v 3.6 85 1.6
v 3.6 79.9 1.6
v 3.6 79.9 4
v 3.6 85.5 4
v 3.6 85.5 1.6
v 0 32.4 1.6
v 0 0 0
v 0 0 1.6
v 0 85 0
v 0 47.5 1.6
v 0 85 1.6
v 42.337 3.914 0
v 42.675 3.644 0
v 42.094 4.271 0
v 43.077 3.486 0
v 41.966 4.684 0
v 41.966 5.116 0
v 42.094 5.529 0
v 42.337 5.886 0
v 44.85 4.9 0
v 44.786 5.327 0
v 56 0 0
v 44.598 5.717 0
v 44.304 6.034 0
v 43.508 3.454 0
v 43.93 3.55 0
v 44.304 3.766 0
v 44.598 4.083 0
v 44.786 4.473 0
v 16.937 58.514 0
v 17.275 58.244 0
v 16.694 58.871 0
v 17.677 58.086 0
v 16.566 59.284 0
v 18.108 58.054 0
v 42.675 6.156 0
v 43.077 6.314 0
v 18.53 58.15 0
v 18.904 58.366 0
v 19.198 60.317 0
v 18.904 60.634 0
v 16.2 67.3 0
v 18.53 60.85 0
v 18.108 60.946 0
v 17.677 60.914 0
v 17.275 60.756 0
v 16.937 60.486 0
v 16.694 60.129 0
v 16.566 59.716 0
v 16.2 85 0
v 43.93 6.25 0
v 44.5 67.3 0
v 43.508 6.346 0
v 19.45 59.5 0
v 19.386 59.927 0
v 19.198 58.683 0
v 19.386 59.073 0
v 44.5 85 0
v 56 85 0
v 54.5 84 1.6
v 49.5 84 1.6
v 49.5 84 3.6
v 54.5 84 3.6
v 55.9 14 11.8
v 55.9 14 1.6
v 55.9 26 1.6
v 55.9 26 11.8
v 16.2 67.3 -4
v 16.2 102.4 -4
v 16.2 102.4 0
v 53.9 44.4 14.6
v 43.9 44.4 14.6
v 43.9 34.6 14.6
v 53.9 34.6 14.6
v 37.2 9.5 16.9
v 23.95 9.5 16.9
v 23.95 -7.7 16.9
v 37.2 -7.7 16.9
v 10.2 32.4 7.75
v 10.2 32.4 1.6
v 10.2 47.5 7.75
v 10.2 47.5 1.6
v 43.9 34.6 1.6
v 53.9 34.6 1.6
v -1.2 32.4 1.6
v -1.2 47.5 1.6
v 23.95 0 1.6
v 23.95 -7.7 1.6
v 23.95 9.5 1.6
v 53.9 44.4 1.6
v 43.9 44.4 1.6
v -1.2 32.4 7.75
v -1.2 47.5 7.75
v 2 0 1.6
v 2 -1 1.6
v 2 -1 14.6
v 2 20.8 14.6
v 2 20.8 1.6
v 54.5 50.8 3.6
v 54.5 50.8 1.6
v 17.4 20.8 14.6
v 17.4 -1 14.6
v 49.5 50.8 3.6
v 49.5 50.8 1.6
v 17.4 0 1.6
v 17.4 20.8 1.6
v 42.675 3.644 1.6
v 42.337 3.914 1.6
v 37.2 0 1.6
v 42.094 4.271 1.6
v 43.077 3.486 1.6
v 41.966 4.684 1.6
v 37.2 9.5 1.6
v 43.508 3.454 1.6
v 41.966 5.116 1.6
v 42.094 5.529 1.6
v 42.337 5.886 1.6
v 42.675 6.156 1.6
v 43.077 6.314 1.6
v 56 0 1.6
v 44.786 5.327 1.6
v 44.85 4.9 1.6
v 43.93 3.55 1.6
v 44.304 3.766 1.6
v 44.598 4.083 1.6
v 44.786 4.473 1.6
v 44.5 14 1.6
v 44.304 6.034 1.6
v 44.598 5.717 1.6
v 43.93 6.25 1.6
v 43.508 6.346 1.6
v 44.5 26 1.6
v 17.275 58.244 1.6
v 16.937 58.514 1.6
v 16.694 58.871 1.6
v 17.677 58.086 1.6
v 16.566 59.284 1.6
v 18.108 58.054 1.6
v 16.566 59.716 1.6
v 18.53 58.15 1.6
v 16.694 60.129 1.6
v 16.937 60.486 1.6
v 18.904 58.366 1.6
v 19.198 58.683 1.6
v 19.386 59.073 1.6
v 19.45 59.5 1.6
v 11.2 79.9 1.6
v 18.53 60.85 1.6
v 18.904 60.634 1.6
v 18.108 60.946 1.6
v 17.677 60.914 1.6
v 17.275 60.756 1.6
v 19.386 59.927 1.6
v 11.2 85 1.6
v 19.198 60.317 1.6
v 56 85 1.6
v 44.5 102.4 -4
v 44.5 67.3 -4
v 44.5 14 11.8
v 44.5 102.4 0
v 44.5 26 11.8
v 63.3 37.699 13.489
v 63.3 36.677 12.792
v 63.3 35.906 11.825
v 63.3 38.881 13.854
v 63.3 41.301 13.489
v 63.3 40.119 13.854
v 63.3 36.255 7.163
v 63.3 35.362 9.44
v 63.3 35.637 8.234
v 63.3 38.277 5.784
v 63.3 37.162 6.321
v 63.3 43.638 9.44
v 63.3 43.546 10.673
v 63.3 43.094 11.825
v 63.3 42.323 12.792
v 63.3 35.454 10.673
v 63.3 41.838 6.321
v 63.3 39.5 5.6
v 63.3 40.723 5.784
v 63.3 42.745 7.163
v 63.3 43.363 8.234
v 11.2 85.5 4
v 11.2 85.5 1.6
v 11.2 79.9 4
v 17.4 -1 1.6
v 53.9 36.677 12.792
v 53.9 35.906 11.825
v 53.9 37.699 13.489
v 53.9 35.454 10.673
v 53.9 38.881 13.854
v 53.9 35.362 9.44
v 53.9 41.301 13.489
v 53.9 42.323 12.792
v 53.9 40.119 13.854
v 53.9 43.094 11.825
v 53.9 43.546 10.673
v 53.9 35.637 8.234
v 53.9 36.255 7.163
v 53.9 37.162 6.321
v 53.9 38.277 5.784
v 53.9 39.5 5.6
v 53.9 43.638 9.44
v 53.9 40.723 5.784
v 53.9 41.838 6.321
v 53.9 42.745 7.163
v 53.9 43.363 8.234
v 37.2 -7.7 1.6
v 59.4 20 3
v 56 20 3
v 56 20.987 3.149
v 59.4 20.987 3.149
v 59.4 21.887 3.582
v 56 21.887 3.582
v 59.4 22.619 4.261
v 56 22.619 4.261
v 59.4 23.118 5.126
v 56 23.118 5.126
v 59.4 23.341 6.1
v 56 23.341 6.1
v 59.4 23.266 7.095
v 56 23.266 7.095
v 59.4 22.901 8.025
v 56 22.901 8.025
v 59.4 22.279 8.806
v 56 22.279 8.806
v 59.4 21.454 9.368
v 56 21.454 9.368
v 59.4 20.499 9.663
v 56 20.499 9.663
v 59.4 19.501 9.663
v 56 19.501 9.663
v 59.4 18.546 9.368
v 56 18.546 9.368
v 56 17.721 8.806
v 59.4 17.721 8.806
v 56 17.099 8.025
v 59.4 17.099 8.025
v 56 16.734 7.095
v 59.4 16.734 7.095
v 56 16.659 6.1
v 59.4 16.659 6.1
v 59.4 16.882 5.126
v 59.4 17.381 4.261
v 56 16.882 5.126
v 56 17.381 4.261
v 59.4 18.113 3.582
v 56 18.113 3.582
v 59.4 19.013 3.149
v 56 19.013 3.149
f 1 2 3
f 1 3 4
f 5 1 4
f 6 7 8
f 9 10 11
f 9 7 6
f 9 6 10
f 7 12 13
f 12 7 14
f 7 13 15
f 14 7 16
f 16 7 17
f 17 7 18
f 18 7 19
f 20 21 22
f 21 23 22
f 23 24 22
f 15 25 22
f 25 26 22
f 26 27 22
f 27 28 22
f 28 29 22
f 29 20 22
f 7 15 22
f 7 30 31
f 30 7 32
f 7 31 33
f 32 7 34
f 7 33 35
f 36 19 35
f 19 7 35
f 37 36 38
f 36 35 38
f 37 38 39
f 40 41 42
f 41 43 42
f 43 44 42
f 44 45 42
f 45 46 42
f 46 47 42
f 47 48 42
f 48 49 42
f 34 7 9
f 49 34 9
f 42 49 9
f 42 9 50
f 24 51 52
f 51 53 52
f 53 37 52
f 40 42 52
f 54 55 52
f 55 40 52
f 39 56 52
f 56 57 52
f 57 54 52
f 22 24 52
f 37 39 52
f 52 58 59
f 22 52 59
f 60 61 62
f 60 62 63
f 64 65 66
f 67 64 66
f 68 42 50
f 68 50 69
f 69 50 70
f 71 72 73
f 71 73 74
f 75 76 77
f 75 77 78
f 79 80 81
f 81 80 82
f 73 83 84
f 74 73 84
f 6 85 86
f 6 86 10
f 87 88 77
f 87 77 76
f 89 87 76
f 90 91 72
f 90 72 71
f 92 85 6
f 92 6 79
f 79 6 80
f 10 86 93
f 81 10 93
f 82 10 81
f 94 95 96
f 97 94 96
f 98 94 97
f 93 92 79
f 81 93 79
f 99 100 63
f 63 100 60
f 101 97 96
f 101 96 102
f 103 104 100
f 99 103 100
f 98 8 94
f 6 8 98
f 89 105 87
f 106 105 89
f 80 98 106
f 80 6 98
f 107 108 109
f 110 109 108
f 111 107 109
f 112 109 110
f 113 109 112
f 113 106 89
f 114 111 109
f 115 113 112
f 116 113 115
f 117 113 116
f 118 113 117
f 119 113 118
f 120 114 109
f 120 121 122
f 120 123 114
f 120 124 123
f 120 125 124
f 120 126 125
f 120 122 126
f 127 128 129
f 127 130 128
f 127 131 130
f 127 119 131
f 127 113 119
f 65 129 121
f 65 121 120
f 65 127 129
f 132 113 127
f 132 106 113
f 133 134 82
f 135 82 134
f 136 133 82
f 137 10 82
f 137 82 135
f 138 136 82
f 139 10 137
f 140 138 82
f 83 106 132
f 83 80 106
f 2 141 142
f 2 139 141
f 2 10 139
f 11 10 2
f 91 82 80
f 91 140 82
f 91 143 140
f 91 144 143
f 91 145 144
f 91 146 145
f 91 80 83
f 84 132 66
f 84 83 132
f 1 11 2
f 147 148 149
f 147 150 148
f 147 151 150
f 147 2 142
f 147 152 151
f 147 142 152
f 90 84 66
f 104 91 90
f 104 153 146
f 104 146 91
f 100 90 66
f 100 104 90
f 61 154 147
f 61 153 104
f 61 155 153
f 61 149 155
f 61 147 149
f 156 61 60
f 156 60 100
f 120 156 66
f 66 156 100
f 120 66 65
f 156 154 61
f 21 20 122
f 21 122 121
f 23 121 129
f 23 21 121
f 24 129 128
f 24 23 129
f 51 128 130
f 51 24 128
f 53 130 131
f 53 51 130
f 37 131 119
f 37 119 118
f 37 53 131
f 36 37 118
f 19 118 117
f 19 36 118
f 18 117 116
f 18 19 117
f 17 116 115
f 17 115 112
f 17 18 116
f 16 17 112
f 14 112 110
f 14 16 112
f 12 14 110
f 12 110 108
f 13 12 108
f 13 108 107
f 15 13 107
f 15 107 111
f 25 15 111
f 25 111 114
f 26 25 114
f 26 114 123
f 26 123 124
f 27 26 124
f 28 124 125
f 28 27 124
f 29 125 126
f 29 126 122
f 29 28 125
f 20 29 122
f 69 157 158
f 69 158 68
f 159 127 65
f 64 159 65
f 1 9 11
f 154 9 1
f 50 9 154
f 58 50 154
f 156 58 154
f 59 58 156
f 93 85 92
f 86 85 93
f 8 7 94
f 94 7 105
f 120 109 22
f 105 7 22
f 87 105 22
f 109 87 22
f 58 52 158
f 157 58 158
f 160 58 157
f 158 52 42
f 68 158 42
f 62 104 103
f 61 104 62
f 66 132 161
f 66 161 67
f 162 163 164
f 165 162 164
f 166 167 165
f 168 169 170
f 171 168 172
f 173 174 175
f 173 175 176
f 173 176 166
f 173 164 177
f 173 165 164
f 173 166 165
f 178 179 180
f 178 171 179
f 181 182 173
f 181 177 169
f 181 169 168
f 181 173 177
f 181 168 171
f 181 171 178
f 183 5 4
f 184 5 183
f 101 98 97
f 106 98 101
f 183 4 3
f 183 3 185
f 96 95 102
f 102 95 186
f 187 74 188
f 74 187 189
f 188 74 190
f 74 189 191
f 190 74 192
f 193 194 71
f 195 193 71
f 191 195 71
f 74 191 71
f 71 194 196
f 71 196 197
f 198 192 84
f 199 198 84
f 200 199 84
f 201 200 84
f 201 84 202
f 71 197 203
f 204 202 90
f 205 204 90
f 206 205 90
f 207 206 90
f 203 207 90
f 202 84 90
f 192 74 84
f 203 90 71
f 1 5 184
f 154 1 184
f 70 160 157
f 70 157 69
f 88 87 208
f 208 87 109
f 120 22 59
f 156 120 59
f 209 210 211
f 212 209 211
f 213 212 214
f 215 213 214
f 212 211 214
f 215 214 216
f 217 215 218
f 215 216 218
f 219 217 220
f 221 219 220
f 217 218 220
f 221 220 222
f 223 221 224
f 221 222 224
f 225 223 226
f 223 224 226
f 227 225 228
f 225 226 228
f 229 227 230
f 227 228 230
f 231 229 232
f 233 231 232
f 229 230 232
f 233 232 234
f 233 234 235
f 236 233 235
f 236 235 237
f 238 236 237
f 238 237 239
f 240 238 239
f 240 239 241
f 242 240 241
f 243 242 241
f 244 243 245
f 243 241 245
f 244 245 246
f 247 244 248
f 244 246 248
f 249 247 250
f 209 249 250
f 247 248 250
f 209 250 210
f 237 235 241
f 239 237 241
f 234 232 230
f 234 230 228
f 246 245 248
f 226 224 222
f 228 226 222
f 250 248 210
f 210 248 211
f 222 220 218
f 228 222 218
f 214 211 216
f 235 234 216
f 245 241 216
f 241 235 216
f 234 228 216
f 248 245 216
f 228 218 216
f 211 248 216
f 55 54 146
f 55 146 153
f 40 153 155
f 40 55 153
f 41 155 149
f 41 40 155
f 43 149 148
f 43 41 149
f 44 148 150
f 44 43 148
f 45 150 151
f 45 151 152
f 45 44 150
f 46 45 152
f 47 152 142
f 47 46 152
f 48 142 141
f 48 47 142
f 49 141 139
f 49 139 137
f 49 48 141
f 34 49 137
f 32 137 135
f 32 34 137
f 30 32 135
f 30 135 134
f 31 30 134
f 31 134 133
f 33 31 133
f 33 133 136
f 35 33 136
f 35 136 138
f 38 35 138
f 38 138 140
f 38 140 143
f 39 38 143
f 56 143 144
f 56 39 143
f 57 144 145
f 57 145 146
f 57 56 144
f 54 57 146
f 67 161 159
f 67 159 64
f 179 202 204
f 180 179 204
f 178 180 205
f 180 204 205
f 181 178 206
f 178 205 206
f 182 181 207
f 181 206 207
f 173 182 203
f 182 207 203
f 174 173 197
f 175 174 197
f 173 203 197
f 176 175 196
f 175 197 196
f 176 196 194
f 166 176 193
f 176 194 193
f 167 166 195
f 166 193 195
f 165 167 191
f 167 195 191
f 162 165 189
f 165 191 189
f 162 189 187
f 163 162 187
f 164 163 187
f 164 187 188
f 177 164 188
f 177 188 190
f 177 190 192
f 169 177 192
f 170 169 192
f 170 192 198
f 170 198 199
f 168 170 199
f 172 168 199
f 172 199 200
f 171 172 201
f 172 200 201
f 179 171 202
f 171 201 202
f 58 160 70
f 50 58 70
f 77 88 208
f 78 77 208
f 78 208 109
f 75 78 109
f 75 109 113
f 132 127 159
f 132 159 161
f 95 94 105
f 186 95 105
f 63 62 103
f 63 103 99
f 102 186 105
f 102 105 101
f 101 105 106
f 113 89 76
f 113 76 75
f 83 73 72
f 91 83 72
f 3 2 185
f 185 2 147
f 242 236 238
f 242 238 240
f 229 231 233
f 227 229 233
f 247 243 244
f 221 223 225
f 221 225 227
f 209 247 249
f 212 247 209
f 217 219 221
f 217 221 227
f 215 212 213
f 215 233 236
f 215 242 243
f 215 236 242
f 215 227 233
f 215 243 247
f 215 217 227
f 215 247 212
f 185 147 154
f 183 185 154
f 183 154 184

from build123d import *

# Parameters (mm, degrees)
CROQUIS1_W               = 56
CROQUIS1_H               = 85
CROQUIS1_R               = 1.45
SALIENTE_EXTRUIR1_DEPTH  = 1.6
CROQUIS2_W               = 7.6
CROQUIS2_H               = 5.6
SALIENTE_EXTRUIR2_DEPTH  = 2.4
CROQUIS3_W               = 11.4
CROQUIS3_H               = 15.1
SALIENTE_EXTRUIR3_DEPTH  = 6.15
CROQUIS4_W               = 15.4
CROQUIS4_H               = 21.8
SALIENTE_EXTRUIR4_DEPTH  = 13
CROQUIS5_W               = 13.25
CROQUIS5_H               = 17.2
SALIENTE_EXTRUIR5_DEPTH  = 15.3
CROQUIS6_W               = 11.4
CROQUIS6_H               = 12
SALIENTE_EXTRUIR6_DEPTH  = 10.2
CROQUIS7_W               = 10
CROQUIS7_H               = 9.8
SALIENTE_EXTRUIR7_DEPTH  = 13
CROQUIS8_W               = 5
CROQUIS8_H               = 33.2
SALIENTE_EXTRUIR8_DEPTH  = 2
CROQUIS10_W              = 28.3
CROQUIS10_H              = 35.1
SALIENTE_EXTRUIR9_DEPTH  = 4
CROQUIS11_R              = 3.35
SALIENTE_EXTRUIR10_DEPTH = 3.4
CROQUIS12_R              = 4.15
SALIENTE_EXTRUIR11_DEPTH = 9.4


with BuildPart() as part:
    # Croquis1 → Saliente-Extruir1 (new body)
    with BuildSketch(Plane.XY):
        with Locations((28, 42.5)):
            Rectangle(CROQUIS1_W, CROQUIS1_H)
        with Locations((43.4, 4.9)):
            Circle(CROQUIS1_R, mode=Mode.SUBTRACT)
        with Locations((18, 59.5)):
            Circle(CROQUIS1_R, mode=Mode.SUBTRACT)
    extrude(amount=SALIENTE_EXTRUIR1_DEPTH)

    # Croquis2 → Saliente-Extruir2 (add)
    with BuildSketch(Plane.XY.offset(1.6)):
        with Locations((7.4, 82.7)):
            Rectangle(CROQUIS2_W, CROQUIS2_H)
    extrude(amount=SALIENTE_EXTRUIR2_DEPTH)

    # Croquis3 → Saliente-Extruir3 (add)
    with BuildSketch(Plane.XY.offset(1.6)):
        with Locations((4.5, 39.95)):
            Rectangle(CROQUIS3_W, CROQUIS3_H)
    extrude(amount=SALIENTE_EXTRUIR3_DEPTH)

    # Croquis4 → Saliente-Extruir4 (add)
    with BuildSketch(Plane.XY.offset(1.6)):
        with Locations((9.7, 9.9)):
            Rectangle(CROQUIS4_W, CROQUIS4_H)
    extrude(amount=SALIENTE_EXTRUIR4_DEPTH)

    # Croquis5 → Saliente-Extruir5 (add)
    with BuildSketch(Plane.XY.offset(1.6)):
        with Locations((30.575, 0.9)):
            Rectangle(CROQUIS5_W, CROQUIS5_H)
    extrude(amount=SALIENTE_EXTRUIR5_DEPTH)

    # Croquis6 → Saliente-Extruir6 (add)
    with BuildSketch(Plane.XY.offset(1.6)):
        with Locations((50.2, 20)):
            Rectangle(CROQUIS6_W, CROQUIS6_H)
    extrude(amount=SALIENTE_EXTRUIR6_DEPTH)

    # Croquis7 → Saliente-Extruir7 (add)
    with BuildSketch(Plane.XY.offset(1.6)):
        with Locations((48.9, 39.5)):
            Rectangle(CROQUIS7_W, CROQUIS7_H)
    extrude(amount=SALIENTE_EXTRUIR7_DEPTH)

    # Croquis8 → Saliente-Extruir8 (add)
    with BuildSketch(Plane.XY.offset(1.6)):
        with Locations((52, 67.4)):
            Rectangle(CROQUIS8_W, CROQUIS8_H)
    extrude(amount=SALIENTE_EXTRUIR8_DEPTH)

    # Croquis10 → Saliente-Extruir9 (add)
    with BuildSketch(Plane(origin=(0, 0, 0), x_dir=(-1, 0, 0), z_dir=(0, 0, -1))):
        with Locations((-30.35, 84.85)):
            Rectangle(CROQUIS10_W, CROQUIS10_H)
    extrude(amount=SALIENTE_EXTRUIR9_DEPTH)

    # Croquis12 → Saliente-Extruir11 (add)
    with BuildSketch(Plane(origin=(53.9, 0, 0), x_dir=(0, 0, -1), z_dir=(1, 0, 0))):
        with Locations((-9.75, 39.5)):
            Circle(CROQUIS12_R)
    extrude(amount=SALIENTE_EXTRUIR11_DEPTH)


with BuildPart() as body_2:
    # Croquis11 → Saliente-Extruir10 (new body)
    with BuildSketch(Plane(origin=(56, 0, 0), x_dir=(0, 0, -1), z_dir=(1, 0, 0))):
        with Locations((-6.35, 20)):
            Circle(CROQUIS11_R)
    extrude(amount=SALIENTE_EXTRUIR10_DEPTH)


solid = Compound([part.part, body_2.part])
